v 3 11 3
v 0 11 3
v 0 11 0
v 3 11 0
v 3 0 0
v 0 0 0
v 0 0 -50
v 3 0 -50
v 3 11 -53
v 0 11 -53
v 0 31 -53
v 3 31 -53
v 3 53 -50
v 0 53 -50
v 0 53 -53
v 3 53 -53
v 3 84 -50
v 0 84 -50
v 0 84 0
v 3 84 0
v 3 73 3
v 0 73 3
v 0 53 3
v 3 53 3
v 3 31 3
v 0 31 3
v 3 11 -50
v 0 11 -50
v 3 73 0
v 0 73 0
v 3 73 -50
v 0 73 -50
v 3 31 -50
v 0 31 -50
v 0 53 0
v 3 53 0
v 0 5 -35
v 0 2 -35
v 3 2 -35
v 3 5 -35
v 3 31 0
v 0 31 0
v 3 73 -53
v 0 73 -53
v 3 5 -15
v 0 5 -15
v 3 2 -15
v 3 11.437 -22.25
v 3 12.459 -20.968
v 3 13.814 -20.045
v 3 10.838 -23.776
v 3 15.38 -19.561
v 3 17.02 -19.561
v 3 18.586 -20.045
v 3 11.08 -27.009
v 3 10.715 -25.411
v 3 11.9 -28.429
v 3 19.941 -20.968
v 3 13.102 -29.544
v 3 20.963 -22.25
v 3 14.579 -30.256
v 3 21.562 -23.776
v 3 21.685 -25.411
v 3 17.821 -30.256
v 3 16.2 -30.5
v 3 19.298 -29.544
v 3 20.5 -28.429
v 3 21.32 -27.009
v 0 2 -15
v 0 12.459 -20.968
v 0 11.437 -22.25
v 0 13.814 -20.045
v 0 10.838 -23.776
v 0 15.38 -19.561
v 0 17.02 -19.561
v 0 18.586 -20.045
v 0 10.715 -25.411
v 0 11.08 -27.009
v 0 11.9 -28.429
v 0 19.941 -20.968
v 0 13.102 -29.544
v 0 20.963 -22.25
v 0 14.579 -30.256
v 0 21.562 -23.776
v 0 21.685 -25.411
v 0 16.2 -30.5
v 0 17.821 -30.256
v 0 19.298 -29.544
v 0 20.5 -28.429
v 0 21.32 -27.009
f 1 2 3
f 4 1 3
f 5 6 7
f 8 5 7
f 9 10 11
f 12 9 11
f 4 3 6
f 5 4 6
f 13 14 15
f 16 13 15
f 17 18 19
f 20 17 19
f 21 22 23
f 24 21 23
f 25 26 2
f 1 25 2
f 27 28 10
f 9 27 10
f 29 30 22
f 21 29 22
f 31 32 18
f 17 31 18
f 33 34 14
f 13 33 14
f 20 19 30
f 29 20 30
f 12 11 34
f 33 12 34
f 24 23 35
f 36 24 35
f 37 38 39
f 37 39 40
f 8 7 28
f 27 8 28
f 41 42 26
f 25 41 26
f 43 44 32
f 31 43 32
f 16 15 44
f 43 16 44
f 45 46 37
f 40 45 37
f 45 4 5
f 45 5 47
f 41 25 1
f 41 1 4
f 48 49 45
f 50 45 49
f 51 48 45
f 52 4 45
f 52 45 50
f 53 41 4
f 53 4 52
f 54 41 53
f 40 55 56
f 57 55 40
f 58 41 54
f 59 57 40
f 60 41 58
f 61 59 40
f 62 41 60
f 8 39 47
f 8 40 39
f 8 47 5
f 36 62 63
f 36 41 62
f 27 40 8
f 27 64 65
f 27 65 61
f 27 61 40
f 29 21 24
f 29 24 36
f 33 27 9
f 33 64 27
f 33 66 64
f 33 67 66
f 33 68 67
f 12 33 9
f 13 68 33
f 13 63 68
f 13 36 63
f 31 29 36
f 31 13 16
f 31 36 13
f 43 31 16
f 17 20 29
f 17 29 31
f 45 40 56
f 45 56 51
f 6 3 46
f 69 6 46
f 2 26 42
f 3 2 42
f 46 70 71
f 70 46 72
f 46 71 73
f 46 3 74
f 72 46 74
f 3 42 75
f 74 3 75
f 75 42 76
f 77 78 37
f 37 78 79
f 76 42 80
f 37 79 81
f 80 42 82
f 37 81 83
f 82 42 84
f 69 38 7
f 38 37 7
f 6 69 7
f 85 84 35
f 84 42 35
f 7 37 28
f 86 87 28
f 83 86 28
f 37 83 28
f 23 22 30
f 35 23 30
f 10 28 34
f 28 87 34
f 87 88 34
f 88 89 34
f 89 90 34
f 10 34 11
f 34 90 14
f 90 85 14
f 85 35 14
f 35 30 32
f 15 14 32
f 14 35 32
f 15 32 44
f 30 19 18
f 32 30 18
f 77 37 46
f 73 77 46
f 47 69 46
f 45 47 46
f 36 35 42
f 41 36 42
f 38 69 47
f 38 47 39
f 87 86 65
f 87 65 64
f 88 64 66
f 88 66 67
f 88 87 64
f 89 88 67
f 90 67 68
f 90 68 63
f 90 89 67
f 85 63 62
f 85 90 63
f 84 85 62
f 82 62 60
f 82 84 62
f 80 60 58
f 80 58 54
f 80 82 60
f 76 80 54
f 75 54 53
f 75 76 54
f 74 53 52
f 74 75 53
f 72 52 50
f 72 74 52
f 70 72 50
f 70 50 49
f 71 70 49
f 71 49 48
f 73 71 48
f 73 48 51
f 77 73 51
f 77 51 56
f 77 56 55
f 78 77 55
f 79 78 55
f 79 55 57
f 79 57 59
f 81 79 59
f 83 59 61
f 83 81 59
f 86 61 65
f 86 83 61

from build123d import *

# Parameters (mm, degrees)
SKETCH1_R           = 5.5
SKETCH1_W           = 20
SKETCH1_H           = 3
BOSS_EXTRUDE2_DEPTH = 3


with BuildPart() as part:
    # Sketch1 → Boss-Extrude2 (new body)
    with BuildSketch(Plane(origin=(0, 0, 0), x_dir=(0, 0, -1), z_dir=(1, 0, 0))):
        Polygon((0, 0), (50, 0), (50, 11), (53, 11), (53, 31), (50, 31), (50, 53), (53, 53), (53, 73), (50, 73), (50, 84), (0, 84), (0, 73), (-3, 73), (-3, 53), (0, 53), (0, 31), (-3, 31), (-3, 11), (0, 11), align=None)
        with Locations((25, 16.2)):
            Circle(SKETCH1_R, mode=Mode.SUBTRACT)
        with Locations((25, 3.5)):
            Rectangle(SKETCH1_W, SKETCH1_H, mode=Mode.SUBTRACT)
    extrude(amount=BOSS_EXTRUDE2_DEPTH)


solid = part.part
